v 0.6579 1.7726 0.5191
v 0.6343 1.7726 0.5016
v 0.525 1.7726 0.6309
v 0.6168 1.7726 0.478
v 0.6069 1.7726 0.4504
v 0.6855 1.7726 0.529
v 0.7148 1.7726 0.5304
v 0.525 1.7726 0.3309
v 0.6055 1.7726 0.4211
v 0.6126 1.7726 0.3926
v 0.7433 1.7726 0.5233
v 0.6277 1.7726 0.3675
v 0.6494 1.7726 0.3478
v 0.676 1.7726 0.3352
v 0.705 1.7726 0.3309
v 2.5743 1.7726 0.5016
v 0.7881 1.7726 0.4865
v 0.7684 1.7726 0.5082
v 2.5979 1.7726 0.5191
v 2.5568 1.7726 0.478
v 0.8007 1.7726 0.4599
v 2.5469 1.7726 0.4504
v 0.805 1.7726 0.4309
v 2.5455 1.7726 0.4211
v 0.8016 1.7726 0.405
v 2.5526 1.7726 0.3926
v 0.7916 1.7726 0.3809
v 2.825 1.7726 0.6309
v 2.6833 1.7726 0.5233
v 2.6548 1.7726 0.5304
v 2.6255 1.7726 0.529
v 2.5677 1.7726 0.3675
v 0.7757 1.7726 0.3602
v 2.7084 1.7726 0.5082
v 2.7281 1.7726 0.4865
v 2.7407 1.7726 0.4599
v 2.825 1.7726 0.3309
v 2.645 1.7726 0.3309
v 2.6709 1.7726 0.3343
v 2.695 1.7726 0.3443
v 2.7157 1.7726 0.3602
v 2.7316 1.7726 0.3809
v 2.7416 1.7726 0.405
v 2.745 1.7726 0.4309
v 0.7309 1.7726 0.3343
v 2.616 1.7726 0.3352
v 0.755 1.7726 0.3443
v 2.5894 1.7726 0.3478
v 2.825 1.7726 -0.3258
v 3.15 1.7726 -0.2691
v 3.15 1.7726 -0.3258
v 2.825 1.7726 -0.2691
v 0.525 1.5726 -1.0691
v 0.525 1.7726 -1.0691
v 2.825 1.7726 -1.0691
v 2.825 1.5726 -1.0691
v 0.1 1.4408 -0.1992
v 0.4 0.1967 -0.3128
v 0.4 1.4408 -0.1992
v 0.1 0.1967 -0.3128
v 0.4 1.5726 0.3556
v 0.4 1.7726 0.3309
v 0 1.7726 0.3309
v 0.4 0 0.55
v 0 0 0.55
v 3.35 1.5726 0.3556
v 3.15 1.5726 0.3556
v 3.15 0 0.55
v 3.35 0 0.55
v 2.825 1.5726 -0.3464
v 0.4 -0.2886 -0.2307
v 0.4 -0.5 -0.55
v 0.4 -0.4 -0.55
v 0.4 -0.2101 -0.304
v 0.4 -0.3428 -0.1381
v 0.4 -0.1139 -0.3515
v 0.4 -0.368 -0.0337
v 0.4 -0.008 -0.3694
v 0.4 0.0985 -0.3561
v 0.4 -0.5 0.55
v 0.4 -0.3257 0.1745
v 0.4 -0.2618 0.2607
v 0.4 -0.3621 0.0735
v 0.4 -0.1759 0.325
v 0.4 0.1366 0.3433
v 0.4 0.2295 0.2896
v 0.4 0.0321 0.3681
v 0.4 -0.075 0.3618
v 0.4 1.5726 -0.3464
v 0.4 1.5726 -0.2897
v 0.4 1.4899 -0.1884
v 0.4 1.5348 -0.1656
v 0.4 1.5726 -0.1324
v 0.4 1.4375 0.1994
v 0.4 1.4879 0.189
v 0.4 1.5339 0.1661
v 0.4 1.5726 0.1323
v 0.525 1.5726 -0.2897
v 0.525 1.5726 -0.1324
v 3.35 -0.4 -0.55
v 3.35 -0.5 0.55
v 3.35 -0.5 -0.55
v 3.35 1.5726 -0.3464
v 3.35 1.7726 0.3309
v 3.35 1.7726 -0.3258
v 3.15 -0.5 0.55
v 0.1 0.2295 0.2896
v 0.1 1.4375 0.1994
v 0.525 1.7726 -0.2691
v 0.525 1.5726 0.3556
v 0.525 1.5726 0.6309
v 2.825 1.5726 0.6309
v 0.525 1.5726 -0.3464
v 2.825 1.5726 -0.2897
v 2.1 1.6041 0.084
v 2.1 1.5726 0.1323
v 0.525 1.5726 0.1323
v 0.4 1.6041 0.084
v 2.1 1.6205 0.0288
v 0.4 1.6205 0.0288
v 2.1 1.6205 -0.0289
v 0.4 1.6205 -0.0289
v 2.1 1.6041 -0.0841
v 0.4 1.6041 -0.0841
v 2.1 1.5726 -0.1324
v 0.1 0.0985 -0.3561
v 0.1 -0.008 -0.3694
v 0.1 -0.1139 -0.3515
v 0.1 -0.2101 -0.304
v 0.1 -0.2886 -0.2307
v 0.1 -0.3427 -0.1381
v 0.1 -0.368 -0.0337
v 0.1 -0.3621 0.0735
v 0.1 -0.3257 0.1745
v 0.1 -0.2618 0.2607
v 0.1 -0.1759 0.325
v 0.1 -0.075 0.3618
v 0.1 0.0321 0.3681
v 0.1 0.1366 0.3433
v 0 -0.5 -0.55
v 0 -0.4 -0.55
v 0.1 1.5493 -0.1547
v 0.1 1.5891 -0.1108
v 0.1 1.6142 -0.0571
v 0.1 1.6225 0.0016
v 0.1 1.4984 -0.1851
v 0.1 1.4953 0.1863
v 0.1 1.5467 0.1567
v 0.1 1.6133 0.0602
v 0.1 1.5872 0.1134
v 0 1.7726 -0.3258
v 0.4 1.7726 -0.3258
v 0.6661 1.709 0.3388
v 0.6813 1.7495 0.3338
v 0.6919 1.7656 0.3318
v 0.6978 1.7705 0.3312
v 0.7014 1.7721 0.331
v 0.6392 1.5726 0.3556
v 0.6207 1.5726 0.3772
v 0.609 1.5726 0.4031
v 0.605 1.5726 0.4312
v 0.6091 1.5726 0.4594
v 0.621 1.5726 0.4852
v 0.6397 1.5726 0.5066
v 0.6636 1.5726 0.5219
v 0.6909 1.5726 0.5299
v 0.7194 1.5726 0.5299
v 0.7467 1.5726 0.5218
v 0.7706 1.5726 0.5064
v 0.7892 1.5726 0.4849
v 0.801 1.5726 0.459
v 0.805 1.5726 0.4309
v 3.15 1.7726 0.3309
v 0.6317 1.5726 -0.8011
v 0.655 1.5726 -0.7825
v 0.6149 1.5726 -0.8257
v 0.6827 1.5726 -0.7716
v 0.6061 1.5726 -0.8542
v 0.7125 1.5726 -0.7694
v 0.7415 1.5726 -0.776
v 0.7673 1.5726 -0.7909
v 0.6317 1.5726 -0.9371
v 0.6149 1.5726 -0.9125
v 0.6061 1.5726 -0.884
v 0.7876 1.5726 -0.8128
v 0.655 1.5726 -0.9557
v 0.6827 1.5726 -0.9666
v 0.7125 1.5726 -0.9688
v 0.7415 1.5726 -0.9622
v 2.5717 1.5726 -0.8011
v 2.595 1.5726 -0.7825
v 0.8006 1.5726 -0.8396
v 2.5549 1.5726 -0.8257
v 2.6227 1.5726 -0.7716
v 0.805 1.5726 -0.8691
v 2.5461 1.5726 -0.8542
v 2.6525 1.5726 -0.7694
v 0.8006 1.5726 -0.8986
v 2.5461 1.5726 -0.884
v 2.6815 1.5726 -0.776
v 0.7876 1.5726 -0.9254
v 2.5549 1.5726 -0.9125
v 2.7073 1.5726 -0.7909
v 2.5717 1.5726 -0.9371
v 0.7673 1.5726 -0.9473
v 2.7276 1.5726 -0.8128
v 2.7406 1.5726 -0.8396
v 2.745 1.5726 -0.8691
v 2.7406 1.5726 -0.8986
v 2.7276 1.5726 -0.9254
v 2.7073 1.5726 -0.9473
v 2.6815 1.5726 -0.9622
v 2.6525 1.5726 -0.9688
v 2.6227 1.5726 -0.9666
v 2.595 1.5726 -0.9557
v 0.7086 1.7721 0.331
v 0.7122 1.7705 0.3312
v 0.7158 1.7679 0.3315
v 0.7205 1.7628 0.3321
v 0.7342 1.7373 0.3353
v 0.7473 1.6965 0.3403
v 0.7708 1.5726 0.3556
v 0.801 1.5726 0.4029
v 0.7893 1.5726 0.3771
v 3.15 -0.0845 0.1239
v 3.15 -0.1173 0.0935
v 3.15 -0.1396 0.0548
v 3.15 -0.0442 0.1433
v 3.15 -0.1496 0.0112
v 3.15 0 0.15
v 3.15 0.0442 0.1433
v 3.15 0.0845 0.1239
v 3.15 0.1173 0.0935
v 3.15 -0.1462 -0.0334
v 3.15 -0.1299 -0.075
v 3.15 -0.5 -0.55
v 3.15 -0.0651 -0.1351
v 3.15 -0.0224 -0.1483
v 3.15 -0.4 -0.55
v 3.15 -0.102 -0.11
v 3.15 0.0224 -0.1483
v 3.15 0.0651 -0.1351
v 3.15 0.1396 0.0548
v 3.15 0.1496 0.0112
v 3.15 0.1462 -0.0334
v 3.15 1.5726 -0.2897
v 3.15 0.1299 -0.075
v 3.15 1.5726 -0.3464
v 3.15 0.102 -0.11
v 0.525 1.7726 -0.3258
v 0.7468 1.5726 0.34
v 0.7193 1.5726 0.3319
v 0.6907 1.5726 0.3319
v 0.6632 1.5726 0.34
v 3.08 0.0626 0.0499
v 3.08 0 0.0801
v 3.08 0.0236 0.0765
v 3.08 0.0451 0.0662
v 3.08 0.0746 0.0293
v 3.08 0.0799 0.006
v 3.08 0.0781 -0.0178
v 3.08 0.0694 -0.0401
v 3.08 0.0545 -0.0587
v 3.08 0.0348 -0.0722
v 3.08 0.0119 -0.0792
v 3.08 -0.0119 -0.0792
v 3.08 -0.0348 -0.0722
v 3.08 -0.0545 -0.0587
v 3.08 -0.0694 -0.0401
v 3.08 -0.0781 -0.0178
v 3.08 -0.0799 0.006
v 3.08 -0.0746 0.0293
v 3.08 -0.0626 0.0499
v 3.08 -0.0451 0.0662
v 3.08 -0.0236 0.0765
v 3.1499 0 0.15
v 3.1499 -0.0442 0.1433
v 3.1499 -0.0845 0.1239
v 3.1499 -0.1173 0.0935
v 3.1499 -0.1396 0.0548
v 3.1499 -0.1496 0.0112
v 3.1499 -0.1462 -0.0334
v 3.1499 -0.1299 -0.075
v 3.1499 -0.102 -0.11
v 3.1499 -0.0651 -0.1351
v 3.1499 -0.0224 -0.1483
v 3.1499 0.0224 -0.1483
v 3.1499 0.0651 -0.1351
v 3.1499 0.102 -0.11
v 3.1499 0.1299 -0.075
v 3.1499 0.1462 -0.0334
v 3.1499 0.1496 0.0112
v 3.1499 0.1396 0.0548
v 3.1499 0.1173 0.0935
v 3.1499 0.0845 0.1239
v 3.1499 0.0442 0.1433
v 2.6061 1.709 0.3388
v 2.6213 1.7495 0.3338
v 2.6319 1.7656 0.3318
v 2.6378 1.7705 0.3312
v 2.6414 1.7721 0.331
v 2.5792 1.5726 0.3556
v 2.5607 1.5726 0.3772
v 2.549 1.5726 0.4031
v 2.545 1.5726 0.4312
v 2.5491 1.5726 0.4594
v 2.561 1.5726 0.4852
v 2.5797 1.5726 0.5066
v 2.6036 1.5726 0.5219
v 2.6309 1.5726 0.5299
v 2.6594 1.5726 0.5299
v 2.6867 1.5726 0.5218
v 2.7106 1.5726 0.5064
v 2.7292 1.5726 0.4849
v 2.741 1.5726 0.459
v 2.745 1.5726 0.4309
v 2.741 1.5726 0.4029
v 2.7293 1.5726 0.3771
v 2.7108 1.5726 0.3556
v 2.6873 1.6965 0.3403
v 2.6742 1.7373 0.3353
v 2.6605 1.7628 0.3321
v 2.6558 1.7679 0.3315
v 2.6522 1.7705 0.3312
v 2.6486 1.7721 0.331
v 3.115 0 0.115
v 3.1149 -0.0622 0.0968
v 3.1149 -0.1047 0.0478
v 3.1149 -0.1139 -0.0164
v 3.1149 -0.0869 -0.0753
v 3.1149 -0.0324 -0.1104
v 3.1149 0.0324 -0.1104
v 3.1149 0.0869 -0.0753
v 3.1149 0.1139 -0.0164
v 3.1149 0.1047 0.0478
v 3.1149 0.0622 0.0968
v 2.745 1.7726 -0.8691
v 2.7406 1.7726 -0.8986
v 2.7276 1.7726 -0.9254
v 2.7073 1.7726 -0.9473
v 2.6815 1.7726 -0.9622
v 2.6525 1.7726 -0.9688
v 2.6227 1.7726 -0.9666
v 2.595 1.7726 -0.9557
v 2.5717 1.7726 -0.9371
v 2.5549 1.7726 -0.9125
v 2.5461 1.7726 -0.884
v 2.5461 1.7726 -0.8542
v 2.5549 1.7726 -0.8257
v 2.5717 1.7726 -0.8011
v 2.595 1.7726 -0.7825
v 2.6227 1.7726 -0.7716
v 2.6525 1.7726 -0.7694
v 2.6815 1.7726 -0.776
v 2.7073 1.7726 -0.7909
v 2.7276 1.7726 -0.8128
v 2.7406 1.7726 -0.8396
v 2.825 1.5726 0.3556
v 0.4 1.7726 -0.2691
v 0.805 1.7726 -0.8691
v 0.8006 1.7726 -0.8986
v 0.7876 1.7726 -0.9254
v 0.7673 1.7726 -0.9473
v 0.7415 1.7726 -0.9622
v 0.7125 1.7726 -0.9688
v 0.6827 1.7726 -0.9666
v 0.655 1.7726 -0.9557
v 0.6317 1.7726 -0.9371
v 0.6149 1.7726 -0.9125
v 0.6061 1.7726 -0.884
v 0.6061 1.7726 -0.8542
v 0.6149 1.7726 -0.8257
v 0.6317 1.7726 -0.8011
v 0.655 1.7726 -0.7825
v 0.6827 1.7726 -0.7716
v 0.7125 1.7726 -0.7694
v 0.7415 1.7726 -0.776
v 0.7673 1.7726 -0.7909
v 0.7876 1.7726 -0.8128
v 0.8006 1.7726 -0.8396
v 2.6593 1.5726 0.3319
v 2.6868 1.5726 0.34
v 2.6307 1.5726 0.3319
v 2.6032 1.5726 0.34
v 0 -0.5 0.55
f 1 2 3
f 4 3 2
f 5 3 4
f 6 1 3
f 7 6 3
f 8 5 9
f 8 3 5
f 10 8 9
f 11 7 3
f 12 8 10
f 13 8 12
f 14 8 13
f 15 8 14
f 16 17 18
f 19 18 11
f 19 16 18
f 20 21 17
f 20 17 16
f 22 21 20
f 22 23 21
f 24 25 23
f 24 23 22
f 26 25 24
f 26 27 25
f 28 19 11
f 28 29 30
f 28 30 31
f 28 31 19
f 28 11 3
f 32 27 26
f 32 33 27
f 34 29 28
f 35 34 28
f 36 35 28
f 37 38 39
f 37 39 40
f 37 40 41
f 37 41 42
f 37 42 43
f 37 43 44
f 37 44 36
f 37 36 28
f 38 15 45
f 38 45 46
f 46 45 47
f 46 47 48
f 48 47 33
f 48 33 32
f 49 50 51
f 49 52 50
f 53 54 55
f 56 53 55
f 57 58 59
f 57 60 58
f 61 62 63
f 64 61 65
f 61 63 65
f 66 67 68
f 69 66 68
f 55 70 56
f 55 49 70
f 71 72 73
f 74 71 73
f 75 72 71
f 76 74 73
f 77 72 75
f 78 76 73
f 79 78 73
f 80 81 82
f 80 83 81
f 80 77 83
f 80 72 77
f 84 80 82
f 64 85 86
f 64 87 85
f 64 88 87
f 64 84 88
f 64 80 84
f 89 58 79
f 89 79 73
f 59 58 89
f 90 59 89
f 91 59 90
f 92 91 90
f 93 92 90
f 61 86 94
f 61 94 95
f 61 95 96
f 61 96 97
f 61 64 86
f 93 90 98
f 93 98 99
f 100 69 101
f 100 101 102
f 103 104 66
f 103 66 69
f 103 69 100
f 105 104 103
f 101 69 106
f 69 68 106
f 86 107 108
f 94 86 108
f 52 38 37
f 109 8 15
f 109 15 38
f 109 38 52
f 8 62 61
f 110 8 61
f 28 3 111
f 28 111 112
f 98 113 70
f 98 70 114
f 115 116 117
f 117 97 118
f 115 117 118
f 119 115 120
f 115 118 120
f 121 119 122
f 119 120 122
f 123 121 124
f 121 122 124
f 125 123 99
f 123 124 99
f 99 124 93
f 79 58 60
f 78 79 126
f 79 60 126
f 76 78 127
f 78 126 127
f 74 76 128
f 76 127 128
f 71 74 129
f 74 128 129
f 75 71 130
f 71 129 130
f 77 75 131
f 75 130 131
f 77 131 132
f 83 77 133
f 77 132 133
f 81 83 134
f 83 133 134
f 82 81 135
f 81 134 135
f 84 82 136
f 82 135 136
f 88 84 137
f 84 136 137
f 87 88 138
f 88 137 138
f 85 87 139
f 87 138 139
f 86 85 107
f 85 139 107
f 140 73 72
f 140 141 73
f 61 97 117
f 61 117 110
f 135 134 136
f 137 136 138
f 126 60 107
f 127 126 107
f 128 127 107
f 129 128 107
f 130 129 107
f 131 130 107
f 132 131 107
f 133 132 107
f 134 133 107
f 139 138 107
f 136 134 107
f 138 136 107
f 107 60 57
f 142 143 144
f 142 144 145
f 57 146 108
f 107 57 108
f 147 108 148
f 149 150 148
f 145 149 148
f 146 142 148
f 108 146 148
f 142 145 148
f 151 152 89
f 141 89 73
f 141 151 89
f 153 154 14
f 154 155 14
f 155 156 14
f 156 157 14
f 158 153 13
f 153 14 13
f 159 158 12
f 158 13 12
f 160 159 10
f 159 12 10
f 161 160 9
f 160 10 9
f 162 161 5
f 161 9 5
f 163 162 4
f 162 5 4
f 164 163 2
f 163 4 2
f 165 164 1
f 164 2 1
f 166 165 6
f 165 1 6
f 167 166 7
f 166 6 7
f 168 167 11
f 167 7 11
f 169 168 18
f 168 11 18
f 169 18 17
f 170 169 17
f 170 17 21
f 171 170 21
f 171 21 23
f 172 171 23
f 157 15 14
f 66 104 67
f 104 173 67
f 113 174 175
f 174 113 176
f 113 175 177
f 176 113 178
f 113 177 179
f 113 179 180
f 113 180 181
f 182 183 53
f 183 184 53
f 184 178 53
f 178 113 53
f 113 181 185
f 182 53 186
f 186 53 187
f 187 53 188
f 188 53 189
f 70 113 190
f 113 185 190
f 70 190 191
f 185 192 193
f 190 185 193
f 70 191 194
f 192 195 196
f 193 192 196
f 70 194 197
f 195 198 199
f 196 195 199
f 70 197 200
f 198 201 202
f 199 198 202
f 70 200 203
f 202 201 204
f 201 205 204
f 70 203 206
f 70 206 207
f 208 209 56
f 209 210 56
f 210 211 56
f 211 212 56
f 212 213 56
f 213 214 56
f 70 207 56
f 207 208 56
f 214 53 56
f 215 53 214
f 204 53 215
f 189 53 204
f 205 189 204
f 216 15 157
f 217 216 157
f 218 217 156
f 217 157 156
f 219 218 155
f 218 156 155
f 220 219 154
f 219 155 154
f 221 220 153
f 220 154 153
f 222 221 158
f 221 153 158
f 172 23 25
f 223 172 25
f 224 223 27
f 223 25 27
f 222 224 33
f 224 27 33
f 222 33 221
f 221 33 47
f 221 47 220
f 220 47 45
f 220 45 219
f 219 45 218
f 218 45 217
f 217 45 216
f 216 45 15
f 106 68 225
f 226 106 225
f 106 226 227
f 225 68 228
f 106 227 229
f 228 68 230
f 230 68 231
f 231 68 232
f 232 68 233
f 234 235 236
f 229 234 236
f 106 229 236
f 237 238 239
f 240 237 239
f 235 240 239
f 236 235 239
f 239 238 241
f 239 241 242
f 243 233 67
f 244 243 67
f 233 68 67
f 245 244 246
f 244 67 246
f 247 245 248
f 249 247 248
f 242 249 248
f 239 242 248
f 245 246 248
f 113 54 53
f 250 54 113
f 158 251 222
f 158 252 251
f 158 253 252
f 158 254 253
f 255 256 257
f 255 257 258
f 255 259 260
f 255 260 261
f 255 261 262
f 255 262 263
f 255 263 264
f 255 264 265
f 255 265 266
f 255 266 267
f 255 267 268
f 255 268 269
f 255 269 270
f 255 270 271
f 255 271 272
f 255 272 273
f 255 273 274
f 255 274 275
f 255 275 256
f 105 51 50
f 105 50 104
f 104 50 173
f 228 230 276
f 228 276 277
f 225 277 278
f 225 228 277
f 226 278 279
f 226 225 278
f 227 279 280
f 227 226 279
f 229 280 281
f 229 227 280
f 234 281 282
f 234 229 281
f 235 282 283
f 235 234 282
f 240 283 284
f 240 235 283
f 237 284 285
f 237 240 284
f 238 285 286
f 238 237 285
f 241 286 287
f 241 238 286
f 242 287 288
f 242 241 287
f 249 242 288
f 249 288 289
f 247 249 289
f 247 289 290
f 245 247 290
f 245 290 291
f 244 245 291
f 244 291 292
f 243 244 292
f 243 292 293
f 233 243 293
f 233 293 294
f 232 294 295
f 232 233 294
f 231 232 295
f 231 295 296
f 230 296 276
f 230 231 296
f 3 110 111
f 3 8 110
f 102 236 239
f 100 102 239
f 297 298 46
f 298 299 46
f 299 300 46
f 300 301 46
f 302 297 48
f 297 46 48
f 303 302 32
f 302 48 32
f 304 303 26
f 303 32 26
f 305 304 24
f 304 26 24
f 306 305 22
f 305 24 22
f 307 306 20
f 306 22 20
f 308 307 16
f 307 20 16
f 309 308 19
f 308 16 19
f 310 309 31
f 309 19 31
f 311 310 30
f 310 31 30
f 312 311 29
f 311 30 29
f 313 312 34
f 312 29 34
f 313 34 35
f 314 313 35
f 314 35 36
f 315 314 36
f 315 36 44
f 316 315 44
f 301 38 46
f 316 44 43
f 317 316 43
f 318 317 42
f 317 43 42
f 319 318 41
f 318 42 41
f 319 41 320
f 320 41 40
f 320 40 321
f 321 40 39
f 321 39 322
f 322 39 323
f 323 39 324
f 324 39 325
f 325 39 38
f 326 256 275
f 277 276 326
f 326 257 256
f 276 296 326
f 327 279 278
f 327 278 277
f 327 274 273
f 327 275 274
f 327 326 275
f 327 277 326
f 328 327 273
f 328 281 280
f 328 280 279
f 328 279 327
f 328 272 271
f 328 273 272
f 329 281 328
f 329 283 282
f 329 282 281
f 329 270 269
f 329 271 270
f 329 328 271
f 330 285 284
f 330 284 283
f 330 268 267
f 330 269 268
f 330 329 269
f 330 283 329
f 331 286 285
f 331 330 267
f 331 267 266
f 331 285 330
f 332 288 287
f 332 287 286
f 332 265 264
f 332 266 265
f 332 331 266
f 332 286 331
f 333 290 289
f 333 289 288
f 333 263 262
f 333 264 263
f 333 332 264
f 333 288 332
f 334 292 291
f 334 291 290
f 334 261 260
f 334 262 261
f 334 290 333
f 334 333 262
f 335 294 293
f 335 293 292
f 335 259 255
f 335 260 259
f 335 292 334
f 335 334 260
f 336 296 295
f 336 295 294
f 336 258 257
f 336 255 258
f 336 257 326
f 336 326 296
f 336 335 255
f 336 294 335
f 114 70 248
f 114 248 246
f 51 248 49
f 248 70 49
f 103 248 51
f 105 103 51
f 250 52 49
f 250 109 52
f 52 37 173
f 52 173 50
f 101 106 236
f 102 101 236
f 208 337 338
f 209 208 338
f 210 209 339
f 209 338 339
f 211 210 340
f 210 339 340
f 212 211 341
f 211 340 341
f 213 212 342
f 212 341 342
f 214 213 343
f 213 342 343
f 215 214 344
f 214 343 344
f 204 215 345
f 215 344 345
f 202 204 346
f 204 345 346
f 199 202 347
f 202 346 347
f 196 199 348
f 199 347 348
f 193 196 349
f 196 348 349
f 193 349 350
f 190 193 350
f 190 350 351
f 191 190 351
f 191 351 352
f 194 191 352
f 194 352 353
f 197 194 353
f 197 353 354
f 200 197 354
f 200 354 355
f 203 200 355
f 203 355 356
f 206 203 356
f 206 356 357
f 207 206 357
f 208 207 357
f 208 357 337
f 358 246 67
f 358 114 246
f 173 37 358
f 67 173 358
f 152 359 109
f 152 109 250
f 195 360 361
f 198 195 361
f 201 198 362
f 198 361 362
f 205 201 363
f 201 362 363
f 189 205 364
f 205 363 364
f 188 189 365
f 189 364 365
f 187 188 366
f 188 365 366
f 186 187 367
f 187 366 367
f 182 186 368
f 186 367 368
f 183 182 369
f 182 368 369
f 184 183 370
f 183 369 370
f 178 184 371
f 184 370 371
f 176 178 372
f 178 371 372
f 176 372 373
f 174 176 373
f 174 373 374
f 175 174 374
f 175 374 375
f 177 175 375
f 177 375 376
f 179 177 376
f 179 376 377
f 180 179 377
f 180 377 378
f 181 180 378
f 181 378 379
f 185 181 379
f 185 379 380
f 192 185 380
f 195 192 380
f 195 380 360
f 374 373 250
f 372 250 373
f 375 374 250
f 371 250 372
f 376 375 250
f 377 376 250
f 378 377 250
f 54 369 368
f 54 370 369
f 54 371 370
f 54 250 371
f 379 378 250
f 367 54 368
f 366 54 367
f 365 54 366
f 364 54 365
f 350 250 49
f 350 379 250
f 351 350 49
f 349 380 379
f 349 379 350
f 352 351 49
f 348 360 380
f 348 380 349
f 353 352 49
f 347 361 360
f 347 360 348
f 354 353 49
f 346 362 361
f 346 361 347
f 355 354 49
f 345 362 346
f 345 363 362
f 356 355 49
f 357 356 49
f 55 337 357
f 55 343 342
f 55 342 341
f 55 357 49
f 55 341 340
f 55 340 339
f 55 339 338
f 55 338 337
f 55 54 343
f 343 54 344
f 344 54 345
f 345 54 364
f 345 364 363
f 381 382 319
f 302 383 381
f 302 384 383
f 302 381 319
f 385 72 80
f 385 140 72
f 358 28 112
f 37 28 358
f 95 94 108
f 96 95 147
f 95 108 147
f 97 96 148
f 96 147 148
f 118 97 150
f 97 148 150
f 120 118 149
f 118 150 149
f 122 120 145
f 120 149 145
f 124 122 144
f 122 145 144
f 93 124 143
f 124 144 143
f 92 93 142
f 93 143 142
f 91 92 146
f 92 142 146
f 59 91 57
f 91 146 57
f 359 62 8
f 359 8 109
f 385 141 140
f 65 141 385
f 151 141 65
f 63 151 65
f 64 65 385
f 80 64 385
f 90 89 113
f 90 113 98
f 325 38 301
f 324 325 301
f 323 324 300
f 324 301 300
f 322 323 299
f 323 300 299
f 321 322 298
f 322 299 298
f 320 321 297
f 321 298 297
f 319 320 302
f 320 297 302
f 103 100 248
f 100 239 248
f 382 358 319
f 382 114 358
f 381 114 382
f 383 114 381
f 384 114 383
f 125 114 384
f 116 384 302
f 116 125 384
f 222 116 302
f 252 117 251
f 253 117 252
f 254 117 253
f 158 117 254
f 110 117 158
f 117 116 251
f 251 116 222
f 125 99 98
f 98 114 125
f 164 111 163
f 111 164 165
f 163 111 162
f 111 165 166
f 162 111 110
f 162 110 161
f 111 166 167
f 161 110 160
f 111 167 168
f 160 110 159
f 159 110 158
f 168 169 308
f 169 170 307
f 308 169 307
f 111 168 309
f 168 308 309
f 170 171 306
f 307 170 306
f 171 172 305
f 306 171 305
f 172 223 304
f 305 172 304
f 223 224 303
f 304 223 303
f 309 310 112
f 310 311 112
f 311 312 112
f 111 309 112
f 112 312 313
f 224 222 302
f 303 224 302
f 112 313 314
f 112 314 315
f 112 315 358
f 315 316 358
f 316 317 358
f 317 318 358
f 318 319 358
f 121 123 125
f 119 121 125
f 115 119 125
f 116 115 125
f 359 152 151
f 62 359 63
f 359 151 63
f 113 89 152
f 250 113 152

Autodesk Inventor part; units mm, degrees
ref_plane "YZ Plane" through (0, 0, 0) normal (1, 0, 0) x (0, 1, 0)
ref_plane "XZ Plane" through (0, 0, 0) normal (0, 1, 0) x (-1, 0, 0)
ref_plane "XY Plane" through (0, 0, 0) normal (0, 0, 1) x (1, 0, 0)
sketch "Boceto1" plane through (0, 0, 0) normal (1, 0, 0) x (0, 1, 0)
  arc A0 (0.2295, 0.2896) -> (0.1967, -0.3128) centre (0, 0) ccw
  arc A1 (1.4408, -0.1992) -> (1.4375, 0.1994) centre (1.4226, 0) ccw
  line L0 (0.2295, 0.2896) -> (1.4375, 0.1994)
  line L1 (0.1967, -0.3128) -> (1.4408, -0.1992)
  circle A2 centre (0, 0) radius 0.3
  line L2 (0, 0) -> (0, 0.55)
  line L3 (1.7726, 0.3309) -> (0, 0.55)
  line L4 (0, 0.55) -> (-0.5, 0.55)
  line L5 (-0.5, 0.55) -> (-0.5, 0)
  line L6 (1.7726, -0.3258) -> (-0.4, -0.55)
  line L7 (-0.4, -0.55) -> (-0.5, -0.55)
  line L8 (-0.5, -0.55) -> (-0.5, 0)
  line L9 (1.6226, 0.0017) -> (1.7726, 0.0017)
  line L10 (1.7726, 0.0017) -> (1.7726, 0.3309)
  line L11 (1.7726, 0.3309) -> (1.7726, -0.3258)
  dimension "d0" = 0.55
  dimension "d3" = 0.5
extrude "Extrusión1" add sketch "Boceto1" along normal blind 0.4 contours A0 L2 L3 L10 L9 A1 L0 | A0 L1 A1 L9 L11 L6 L7 L8 L5 L4 L2
sketch "Boceto2" plane through (0, 0, 0) normal (-1, 0, 0) x (0, 0, 1)
  line L0 (0.1994, 1.4375) -> (0.2896, 0.2295) projected
  arc A0 (-0.3128, 0.1967) -> (0.2896, 0.2295) centre (0, 0) ccw projected
  line L1 (-0.3128, 0.1967) -> (-0.1992, 1.4408) projected
  arc A1 (0.1994, 1.4375) -> (-0.1992, 1.4408) centre (0, 1.4226) ccw projected
  line L2 (0.3309, 1.7726) -> (0.55, 0) projected
  line L3 (-0.55, -0.4) -> (-0.3258, 1.7726) projected
  line L4 (-0.55, -0.5) -> (-0.55, -0.4) projected
  line L5 (0.55, -0.5) -> (-0.55, -0.5) projected
  line L6 (0.55, 0) -> (0.55, -0.5) projected
  line L7 (-0.3258, 1.7726) -> (0.3309, 1.7726) projected
extrude "Extrusión2" add sketch "Boceto2" against normal blind 0.1 contours L0 A0 L1 A1
sketch "Boceto3" plane through (0.4, 0, 0) normal (1, 0, 0) x (0, 0, -1)
  line L0 (-0.3, 2.0226) -> (0.3, 2.0226) projected
  line L1 (-0.3309, 1.7726) -> (-0.55, 0) projected
  line L2 (0.55, -0.4) -> (0.3258, 1.7726) projected
  line L3 (-0.3309, 1.7726) -> (-0.55, 0) projected
  line L4 (-0.3309, 1.7726) -> (0.3258, 1.7726)
  line L5 (0.55, -0.4) -> (0.3258, 1.7726) projected
  line L6 (0.2897, 1.5726) -> (0.2691, 1.7726)
  line L7 (0.3464, 1.5726) -> (-0.3556, 1.5726)
  line L8 (-0.3309, 1.7726) -> (-0.3556, 1.5726)
  line L9 (0.3258, 1.7726) -> (0.3464, 1.5726)
  point P0 (0, 0)
  point P1 (-0.3068, 1.9676)
extrude "Extrusión3" add sketch "Boceto3" along normal blind 2.75
sketch "Boceto4" plane through (3.15, 0, 0) normal (1, 0, 0) x (0, 0, -1)
  line L0 (-0.3556, 1.5726) -> (-0.55, 0) projected
  line L1 (-0.55, 0) -> (-0.55, -0.5) projected
  line L2 (-0.55, -0.5) -> (0.55, -0.5) projected
  line L3 (0.55, -0.5) -> (0.55, -0.4) projected
  line L4 (0.55, -0.4) -> (0.3464, 1.5726) projected
  line L5 (-0.2896, 0.2295) -> (-0.1994, 1.4375) projected
  arc A0 (-0.1323, 1.5726) -> (-0.1994, 1.4375) centre (0, 1.4226) ccw projected
  line L6 (0.1992, 1.4408) -> (0.3128, 0.1967) projected
  arc A1 (-0.2896, 0.2295) -> (0.3128, 0.1967) centre (0, 0) ccw projected
  line L7 (0.3258, 1.7726) -> (-0.3309, 1.7726) projected
  line L8 (-0.3556, 1.5726) -> (0.3464, 1.5726) projected
  line L9 (-0.3309, 1.7726) -> (-0.3556, 1.5726) projected
  line L10 (0.3464, 1.5726) -> (0.1323, 1.5726) projected
  arc A2 (0.1992, 1.4408) -> (0.1323, 1.5726) centre (0, 1.4226) ccw projected
  line L11 (-0.1323, 1.5726) -> (-0.3556, 1.5726) projected
  line L12 (0.3464, 1.5726) -> (0.3258, 1.7726) projected
  line L13 (-0.3309, 1.7726) -> (-0.55, 0) projected
  line L14 (0.3258, 1.7726) -> (-0.3309, 1.7726) projected
  line L15 (0.55, -0.4) -> (0.3258, 1.7726) projected
  line L16 (0.55, -0.5) -> (0.55, -0.4) projected
  line L17 (-0.55, -0.5) -> (0.55, -0.5) projected
  line L18 (-0.55, 0) -> (-0.55, -0.5) projected
  line L19 (0.3464, 1.5726) -> (0.1323, 1.5726) projected
  arc A3 (0.1992, 1.4408) -> (0.1323, 1.5726) centre (0, 1.4226) ccw projected
  line L20 (0.1992, 1.4408) -> (0.3128, 0.1967) projected
  arc A4 (-0.2896, 0.2295) -> (0.3128, 0.1967) centre (0, 0) ccw projected
  line L21 (-0.2896, 0.2295) -> (-0.1994, 1.4375) projected
  arc A5 (-0.1323, 1.5726) -> (-0.1994, 1.4375) centre (0, 1.4226) ccw projected
  line L22 (-0.1323, 1.5726) -> (-0.3556, 1.5726) projected
  line L23 (-0.3556, 1.5726) -> (-0.55, 0) projected
  line L24 (-0.55, 0) -> (-0.55, -0.5) projected
  line L25 (-0.55, -0.5) -> (0.55, -0.5) projected
  line L26 (0.55, -0.5) -> (0.55, -0.4) projected
  line L27 (0.55, -0.4) -> (0.3464, 1.5726) projected
extrude "Extrusión4" add sketch "Boceto4" along normal blind 0.2
sketch "Boceto5" plane through (3.15, 0, 0) normal (-1, 0, 0) x (0, 0, 1)
  line L0 (0.2896, 0.2295) -> (0.1994, 1.4375) projected
  arc A0 (-0.3128, 0.1967) -> (0.2896, 0.2295) centre (0, 0) ccw projected
  line L1 (-0.1992, 1.4408) -> (-0.3128, 0.1967) projected
  arc A1 (0.1994, 1.4375) -> (-0.1992, 1.4408) centre (0, 1.4226) ccw projected
  circle A2 centre (0, 0) radius 0.3695
  circle A3 centre (0, 0) radius 0.15
  dimension "d13" = 0.3
extrude "Extrusión5" add sketch "Boceto5" along normal blind 0.07 contours A3
chamfer "Chaflán1" distance 0.07 angle 45 1 edges at (3.08, 0, -0.15)
sketch "Boceto8" plane through (0, 1.7726, 0.3309) normal (0, 1, 0) x (1, 0, 0)
  line L0 (3.35, 0.6567) -> (3.35, 0) projected
  circle A0 centre (0.705, 1.2) radius 0.1
  circle A1 centre (2.645, 1.2) radius 0.1
  line L1 (2.825, -0.3) -> (2.825, 1.4)
  line L2 (0.525, 1.4) -> (0.525, -0.3)
  line L3 (0.525, -0.3) -> (0.525, 1.2)
  line L4 (0.525, -0.1) -> (0.705, -0.1)
  circle A2 centre (0.705, -0.1) radius 0.1
  circle A3 centre (2.645, -0.1) radius 0.1
  line L5 (0.525, -0.3) -> (0.525, -0.1)
  line L6 (0.525, -0.3) -> (2.825, -0.3)
  line L7 (2.645, -0.1) -> (2.645, 0)
  line L8 (2.645, 0) -> (0.705, 0)
  line L9 (0, 0) -> (3.35, 0) projected
  line L10 (3.35, 0) -> (0, 0)
  line L11 (2.645, -0.1) -> (2.645, 1.2)
  line L12 (0.525, 1.4) -> (2.825, 1.4)
  dimension "d65" = 0.2
  dimension "d63" = 0.2
  dimension "d64" = 0.18
  dimension "d66" = 1.5
  dimension "d67" = 0.2
extrude "Extrusión8" add sketch "Boceto8" against normal blind 0.2 contours L6 L2 L4 A2 L8 L9 L1 | L9 L8 L2 L12 L1 | L2 L9 A2 L4
sketch "Boceto9" plane through (0.1, 0, 0) normal (1, 0, 0) x (0, 0, -1)
  line L0 (-0.2896, 0.2295) -> (-0.1994, 1.4375) projected
  arc A0 (-0.2896, 0.2295) -> (0.3128, 0.1967) centre (0, 0) ccw projected
  line L1 (0.1992, 1.4408) -> (0.3128, 0.1967) projected
  arc A1 (0.1992, 1.4408) -> (-0.1994, 1.4375) centre (0, 1.4226) ccw projected
extrude "Extrusión9" cut sketch "Boceto9" along normal blind 2
properties part number "soporteCamaraB"
